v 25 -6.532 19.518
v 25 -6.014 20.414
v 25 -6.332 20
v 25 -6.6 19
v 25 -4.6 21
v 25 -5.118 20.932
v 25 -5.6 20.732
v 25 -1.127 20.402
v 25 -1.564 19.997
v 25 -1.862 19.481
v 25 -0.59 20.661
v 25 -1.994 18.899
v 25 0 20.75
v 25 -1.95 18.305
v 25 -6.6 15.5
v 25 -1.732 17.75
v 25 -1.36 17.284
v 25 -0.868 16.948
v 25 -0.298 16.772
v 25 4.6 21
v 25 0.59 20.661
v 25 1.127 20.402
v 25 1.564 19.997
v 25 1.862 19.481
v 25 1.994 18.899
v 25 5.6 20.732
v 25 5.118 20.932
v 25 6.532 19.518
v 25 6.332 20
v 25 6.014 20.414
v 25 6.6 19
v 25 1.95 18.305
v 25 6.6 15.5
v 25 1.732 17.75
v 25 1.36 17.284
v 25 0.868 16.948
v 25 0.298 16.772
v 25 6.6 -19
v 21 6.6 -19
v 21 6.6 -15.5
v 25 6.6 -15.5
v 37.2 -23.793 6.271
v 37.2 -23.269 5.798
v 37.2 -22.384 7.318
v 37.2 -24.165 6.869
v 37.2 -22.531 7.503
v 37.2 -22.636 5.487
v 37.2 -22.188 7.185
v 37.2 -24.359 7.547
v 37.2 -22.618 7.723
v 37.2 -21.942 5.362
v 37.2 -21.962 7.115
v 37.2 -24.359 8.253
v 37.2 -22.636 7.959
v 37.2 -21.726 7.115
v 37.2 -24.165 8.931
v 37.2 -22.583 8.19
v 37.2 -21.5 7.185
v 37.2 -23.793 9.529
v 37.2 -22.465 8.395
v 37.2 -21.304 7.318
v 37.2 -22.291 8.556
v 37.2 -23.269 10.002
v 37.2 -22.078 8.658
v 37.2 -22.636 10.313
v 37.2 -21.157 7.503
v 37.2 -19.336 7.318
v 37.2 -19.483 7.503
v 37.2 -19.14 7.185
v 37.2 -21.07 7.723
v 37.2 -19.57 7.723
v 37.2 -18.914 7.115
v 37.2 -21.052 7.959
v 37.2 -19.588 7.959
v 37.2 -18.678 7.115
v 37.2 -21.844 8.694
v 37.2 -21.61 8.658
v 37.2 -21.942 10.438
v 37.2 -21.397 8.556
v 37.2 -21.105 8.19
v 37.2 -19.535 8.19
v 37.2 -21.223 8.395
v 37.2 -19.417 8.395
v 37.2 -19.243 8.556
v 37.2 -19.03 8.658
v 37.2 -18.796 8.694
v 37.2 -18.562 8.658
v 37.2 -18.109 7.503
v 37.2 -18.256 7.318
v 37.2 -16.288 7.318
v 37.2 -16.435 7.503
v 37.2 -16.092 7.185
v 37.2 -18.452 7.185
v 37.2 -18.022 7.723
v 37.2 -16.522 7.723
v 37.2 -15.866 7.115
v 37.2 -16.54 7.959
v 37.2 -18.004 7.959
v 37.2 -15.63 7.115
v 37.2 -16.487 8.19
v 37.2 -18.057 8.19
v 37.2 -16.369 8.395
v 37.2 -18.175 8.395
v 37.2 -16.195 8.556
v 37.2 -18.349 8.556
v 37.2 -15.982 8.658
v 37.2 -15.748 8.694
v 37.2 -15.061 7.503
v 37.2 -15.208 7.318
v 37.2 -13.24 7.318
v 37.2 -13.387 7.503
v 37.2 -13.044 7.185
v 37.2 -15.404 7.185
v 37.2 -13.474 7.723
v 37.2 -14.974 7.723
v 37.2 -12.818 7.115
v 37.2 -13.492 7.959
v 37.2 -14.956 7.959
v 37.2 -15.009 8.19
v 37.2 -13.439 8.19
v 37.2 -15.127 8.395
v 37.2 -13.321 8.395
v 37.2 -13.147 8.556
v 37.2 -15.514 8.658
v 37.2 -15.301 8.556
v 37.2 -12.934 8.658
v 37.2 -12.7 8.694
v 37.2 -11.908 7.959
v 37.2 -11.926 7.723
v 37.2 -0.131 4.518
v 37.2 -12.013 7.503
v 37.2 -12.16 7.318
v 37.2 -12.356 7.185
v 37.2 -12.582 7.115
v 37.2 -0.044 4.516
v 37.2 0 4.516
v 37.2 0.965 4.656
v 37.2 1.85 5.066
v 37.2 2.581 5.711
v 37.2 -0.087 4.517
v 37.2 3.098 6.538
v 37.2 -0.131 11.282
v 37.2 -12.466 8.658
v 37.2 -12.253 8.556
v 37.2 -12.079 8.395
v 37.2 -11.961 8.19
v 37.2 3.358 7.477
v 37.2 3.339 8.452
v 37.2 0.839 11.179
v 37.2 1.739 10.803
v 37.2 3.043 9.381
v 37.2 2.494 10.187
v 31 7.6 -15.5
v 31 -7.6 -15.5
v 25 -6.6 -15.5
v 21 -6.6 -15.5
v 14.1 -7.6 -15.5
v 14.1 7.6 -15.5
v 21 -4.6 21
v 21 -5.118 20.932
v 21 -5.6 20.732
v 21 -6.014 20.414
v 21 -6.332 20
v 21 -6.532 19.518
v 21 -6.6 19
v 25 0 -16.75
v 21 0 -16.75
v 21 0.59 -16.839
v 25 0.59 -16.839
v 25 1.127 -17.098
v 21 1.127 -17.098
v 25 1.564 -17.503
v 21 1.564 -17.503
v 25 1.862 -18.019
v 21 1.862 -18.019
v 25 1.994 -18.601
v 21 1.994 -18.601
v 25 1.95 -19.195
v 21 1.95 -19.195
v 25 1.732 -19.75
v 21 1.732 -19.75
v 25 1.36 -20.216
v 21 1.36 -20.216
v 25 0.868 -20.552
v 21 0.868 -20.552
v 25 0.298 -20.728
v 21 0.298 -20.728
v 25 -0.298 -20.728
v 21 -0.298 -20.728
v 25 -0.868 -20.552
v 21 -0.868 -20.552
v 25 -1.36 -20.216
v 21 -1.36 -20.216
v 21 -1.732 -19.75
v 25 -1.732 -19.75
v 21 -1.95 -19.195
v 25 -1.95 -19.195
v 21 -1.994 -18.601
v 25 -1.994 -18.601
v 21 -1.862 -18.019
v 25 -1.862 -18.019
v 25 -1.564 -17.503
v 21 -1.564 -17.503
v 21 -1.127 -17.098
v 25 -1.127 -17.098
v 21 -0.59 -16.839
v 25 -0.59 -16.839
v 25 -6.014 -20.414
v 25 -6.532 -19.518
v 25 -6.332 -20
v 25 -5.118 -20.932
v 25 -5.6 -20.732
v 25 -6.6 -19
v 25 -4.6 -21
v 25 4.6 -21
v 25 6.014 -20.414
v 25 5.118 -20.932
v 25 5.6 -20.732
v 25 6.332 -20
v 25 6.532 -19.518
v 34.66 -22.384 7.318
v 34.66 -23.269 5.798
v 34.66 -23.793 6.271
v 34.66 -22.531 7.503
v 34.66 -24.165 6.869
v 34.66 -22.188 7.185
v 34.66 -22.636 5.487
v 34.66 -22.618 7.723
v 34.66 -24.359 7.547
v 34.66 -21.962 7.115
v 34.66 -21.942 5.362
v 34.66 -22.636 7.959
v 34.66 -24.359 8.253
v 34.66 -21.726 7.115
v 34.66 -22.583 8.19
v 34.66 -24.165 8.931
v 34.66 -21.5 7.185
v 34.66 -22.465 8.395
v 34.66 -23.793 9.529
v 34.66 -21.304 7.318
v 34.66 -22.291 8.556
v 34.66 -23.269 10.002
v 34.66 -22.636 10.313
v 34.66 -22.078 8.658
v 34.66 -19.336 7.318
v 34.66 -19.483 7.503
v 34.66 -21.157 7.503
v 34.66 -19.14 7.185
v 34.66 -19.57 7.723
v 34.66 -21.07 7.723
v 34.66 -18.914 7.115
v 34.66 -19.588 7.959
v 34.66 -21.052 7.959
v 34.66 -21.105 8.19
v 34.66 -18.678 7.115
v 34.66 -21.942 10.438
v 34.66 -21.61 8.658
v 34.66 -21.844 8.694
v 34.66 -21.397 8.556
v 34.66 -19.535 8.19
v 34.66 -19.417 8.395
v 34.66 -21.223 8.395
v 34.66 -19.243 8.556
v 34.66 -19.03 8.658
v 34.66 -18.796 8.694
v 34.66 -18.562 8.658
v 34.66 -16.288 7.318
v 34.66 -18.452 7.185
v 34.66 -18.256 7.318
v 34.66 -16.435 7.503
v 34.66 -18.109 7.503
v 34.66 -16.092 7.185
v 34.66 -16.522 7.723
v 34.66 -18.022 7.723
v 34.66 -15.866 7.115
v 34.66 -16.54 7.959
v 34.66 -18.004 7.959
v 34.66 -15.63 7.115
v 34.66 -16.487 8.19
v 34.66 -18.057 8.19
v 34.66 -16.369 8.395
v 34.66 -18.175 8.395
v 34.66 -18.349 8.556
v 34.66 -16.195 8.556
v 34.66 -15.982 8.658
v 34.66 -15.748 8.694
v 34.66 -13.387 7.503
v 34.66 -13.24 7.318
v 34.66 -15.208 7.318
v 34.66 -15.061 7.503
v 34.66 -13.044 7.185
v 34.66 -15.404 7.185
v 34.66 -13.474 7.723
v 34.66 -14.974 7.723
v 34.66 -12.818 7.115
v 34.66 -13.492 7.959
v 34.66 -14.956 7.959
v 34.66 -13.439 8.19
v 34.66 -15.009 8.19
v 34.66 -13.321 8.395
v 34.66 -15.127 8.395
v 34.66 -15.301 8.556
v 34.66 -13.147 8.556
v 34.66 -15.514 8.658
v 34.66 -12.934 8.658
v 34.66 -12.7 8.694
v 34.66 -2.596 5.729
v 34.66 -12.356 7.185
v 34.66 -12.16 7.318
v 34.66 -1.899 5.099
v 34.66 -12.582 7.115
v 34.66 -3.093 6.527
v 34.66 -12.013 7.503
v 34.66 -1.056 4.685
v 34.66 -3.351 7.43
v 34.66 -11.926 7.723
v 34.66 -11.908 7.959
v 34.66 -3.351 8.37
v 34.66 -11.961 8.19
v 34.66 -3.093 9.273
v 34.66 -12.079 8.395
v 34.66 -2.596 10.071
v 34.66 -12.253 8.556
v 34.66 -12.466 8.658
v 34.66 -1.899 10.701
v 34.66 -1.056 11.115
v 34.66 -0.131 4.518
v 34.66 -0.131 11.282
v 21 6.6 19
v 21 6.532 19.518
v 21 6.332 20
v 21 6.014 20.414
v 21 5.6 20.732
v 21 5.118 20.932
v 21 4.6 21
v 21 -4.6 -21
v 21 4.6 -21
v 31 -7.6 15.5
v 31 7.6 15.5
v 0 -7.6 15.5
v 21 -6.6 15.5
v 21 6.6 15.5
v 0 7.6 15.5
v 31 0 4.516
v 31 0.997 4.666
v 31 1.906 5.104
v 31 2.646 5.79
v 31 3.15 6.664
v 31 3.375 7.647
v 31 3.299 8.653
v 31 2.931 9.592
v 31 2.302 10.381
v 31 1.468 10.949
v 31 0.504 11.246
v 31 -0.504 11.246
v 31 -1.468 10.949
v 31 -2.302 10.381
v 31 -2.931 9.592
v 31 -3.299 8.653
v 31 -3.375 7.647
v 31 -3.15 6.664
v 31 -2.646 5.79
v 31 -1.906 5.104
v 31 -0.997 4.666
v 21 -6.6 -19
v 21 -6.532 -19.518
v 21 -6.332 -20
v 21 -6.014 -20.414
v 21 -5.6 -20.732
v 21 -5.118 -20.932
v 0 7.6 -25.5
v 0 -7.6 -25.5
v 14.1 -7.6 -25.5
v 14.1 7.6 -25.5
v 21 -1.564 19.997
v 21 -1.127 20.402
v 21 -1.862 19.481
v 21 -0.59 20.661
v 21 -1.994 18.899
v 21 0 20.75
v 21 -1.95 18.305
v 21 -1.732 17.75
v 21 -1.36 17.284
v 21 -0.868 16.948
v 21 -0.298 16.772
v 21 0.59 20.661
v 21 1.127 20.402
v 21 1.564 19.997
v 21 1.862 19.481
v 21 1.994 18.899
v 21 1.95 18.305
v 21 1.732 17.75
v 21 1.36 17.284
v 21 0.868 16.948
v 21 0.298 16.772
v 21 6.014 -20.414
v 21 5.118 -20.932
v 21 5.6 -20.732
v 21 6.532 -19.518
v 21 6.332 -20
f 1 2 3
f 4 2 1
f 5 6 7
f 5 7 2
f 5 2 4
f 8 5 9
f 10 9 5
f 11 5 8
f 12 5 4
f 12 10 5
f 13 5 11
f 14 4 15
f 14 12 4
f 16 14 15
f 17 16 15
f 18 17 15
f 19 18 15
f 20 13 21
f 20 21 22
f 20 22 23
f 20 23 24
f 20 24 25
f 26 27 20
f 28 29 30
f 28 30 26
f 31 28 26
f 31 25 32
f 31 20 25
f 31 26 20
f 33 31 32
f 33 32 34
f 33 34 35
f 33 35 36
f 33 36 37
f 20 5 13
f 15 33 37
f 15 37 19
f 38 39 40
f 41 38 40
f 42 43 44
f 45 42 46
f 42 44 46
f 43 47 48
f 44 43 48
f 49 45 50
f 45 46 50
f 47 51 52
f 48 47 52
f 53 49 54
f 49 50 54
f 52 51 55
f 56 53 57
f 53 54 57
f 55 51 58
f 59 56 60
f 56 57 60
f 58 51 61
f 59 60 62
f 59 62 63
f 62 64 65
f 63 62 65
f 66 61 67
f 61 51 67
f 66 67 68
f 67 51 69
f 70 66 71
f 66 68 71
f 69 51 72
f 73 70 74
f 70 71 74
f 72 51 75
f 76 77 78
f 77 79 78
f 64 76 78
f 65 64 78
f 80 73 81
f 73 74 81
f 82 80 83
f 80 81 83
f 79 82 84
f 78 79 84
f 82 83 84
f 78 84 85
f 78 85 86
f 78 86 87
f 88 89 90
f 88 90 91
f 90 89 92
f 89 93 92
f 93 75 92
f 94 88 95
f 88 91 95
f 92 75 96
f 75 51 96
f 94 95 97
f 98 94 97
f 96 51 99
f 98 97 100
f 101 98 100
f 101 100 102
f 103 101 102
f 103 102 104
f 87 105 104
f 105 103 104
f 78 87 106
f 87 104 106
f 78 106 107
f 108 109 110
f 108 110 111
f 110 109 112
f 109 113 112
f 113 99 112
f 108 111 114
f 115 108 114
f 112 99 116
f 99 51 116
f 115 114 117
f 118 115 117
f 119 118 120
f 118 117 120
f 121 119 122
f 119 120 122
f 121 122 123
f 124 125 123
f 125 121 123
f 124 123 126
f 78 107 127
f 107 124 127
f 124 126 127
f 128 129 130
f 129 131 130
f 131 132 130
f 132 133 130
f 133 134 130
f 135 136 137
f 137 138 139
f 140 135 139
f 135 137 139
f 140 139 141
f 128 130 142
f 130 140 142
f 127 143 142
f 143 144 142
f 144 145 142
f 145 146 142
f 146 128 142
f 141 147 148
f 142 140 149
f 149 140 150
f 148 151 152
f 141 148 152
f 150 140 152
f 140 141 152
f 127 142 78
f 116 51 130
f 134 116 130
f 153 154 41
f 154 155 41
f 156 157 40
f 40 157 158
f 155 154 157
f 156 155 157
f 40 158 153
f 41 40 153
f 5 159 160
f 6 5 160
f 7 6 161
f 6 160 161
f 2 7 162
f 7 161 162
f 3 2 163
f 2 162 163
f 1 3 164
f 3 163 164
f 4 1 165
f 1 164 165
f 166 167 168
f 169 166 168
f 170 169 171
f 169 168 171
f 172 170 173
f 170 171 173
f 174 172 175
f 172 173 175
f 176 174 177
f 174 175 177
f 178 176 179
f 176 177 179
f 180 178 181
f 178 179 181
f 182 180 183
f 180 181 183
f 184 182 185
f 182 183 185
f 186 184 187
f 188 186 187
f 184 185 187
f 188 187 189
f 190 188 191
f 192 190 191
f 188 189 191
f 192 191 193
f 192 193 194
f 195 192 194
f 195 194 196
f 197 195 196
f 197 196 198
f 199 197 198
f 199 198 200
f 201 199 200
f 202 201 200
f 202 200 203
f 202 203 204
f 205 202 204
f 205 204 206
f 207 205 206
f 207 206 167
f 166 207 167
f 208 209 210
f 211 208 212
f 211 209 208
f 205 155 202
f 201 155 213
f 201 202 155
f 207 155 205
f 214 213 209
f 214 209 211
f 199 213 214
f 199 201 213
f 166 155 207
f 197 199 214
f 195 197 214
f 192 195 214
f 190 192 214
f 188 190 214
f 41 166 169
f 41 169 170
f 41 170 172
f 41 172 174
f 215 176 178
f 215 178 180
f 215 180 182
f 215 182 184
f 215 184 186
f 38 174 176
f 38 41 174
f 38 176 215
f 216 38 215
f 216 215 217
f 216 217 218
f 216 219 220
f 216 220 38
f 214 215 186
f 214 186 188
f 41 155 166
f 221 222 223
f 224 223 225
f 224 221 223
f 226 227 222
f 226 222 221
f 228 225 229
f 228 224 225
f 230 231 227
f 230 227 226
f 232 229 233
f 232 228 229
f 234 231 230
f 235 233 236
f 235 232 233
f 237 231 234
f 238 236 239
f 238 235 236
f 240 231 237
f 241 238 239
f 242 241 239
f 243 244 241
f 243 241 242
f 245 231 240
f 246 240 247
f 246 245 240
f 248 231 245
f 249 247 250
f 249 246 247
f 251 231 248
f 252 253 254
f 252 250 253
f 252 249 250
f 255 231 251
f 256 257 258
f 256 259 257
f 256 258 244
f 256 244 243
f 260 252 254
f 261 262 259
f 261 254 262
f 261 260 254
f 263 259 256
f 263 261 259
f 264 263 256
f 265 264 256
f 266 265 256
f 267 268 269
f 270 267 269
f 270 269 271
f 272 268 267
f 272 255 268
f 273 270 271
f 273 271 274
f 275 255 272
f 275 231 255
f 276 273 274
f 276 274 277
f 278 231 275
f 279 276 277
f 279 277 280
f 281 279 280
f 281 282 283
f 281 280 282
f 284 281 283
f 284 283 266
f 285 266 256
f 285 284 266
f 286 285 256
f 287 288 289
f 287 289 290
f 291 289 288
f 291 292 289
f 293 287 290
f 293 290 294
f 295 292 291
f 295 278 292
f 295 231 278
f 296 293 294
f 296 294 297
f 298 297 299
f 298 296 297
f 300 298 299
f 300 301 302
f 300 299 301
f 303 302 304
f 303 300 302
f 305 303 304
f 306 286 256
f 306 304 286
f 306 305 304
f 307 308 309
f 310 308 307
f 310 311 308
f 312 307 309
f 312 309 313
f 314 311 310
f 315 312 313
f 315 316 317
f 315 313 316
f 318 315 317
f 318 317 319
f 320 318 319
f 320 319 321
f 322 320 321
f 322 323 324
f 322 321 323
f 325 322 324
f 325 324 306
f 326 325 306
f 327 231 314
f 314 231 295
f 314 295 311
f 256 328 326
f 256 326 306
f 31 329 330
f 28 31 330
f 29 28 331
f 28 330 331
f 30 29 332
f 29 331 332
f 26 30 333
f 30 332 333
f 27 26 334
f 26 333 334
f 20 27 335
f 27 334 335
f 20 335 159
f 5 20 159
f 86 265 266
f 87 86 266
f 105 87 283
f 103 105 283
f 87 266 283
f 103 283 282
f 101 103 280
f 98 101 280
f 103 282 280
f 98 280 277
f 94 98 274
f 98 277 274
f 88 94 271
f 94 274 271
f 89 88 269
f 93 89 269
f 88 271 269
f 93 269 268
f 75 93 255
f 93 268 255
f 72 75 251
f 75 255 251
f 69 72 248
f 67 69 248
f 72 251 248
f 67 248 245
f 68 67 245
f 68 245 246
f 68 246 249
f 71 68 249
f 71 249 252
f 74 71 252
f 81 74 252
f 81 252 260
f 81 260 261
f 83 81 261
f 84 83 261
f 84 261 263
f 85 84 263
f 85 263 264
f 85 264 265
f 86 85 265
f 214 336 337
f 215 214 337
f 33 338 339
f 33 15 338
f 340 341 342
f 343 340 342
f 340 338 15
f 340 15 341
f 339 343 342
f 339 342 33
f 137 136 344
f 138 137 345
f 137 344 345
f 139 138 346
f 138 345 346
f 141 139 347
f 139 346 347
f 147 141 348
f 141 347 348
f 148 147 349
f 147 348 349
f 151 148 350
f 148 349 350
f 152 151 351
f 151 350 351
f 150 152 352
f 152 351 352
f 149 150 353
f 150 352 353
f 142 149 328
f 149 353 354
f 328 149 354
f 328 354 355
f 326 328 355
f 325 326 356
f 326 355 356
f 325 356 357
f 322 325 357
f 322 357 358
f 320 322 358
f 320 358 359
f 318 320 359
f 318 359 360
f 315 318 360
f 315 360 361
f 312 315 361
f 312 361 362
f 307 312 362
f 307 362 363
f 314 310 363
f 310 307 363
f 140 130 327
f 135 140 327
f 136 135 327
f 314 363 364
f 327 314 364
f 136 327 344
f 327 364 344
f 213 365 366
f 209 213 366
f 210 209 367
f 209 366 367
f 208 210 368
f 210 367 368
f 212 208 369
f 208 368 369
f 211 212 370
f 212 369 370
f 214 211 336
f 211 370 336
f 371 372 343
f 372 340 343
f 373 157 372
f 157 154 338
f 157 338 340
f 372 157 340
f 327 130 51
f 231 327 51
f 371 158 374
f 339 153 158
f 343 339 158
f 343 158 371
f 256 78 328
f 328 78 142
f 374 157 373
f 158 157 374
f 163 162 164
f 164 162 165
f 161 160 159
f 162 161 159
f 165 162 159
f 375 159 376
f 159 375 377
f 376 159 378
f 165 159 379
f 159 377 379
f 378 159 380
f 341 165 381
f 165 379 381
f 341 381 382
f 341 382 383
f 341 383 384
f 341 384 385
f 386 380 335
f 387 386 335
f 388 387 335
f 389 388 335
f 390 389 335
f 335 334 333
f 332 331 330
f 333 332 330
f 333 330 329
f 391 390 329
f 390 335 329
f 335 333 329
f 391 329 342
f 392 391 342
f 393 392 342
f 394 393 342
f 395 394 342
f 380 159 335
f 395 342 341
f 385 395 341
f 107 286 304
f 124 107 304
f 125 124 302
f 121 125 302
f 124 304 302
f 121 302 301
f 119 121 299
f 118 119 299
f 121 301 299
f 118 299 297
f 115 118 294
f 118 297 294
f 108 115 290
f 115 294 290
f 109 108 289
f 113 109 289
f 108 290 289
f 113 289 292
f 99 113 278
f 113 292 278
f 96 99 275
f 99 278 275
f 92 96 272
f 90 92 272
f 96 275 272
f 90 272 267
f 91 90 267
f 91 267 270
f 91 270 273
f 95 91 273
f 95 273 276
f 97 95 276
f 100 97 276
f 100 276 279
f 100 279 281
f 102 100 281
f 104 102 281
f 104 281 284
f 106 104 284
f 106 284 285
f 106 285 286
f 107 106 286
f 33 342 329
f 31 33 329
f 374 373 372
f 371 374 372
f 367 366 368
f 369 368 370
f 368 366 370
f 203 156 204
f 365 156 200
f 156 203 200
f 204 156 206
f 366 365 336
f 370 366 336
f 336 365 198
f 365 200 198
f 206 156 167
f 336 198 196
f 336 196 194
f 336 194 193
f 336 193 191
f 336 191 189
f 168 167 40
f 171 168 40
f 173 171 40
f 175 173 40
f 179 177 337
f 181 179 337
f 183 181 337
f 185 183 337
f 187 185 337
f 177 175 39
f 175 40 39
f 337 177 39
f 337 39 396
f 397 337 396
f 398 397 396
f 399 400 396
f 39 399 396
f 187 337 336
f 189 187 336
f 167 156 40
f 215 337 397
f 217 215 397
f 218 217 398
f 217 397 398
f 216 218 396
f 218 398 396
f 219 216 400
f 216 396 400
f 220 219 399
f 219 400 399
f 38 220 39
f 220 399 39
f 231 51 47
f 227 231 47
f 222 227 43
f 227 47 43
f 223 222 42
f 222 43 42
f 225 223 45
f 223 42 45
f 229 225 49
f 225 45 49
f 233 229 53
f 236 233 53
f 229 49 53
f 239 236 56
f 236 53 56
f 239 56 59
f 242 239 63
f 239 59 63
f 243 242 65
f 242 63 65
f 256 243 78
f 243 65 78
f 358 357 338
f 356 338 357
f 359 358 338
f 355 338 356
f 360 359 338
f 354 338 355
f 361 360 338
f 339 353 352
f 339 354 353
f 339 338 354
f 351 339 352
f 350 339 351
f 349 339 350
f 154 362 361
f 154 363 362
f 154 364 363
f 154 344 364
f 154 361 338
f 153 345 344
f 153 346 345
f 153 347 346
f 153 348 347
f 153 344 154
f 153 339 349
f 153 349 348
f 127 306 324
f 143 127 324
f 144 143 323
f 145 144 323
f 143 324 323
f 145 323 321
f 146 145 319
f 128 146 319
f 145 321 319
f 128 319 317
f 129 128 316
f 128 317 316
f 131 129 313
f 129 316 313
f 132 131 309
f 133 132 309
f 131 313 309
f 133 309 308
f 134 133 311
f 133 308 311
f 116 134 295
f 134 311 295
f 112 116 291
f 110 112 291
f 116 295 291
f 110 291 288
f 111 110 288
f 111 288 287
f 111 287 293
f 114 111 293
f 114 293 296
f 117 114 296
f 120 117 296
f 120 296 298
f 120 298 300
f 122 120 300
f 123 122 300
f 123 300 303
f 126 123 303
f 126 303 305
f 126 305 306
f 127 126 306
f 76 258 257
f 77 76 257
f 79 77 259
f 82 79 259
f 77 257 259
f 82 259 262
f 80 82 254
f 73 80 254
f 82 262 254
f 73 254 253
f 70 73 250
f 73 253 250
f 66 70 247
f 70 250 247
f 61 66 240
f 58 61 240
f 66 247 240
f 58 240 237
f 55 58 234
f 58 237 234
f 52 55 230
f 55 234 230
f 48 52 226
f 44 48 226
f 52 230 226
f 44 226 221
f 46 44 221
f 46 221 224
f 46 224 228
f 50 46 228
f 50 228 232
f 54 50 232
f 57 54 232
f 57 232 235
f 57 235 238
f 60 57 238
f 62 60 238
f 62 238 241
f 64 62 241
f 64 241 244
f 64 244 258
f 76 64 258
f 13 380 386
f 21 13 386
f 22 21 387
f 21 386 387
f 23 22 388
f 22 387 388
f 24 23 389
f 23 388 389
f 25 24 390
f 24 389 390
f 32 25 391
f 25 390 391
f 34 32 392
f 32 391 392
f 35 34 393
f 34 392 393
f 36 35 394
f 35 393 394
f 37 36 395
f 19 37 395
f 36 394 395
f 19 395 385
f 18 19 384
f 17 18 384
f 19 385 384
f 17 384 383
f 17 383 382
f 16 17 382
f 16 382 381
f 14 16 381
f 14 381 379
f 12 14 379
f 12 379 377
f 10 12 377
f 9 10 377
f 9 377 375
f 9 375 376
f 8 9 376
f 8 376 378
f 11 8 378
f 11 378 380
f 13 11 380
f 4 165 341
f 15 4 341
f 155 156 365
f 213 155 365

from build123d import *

# Parameters (mm, degrees)
SKETCH1_W                          = 31
SKETCH1_H                          = 15.2
BOSS_EXTRUDE1_DEPTH                = 31
BOSS_EXTRUDE2_START                = 21
BOSS_EXTRUDE2_DEPTH                = 4
F_4_0MM_DOWEL_HOLE1_D              = 4
F_4_0MM_DOWEL_HOLE1_DEPTH          = 10.668
F_4_0MM_DOWEL_HOLE1_TIP            = 1.201721238
SKETCH6_R                          = 3.38413067
BOSS_EXTRUDE3_DEPTH                = 6.2
BOSS_EXTRUDE4_DEPTH                = 2.54
F_1_16_0_0625_DIAMETER_HOLE1_D     = 1.5875
F_1_16_0_0625_DIAMETER_HOLE1_DEPTH = 2.54
SKETCH12_W                         = 14.1
SKETCH12_H                         = 15.2
BOSS_EXTRUDE5_DEPTH                = 10


with BuildPart() as part:
    # Sketch1 → Boss-Extrude1 (new body)
    with BuildSketch(Plane(origin=(0, 0, 0), x_dir=(0, 0, -1), z_dir=(1, 0, 0))):
        Rectangle(SKETCH1_W, SKETCH1_H)
    extrude(amount=BOSS_EXTRUDE1_DEPTH)

    # Sketch2 → Boss-Extrude2 (add)
    with BuildSketch(Plane(origin=(0, 0, 0), x_dir=(0, 0, -1), z_dir=(1, 0, 0)).offset(BOSS_EXTRUDE2_START)):
        with BuildLine():
            Line((-15.5, 6.6), (-19, 6.6))
            ThreePointArc((-19, 6.6), (-20.414213562, 6.014213562), (-21, 4.6))
            Line((-21, 4.6), (-21, -4.6))
            ThreePointArc((-21, -4.6), (-20.414213562, -6.014213562), (-19, -6.6))
            Line((-19, -6.6), (-15.5, -6.6))
            Line((-15.5, -6.6), (-15.5, 6.6))
        make_face()
        with BuildLine():
            Line((15.5, -6.6), (19, -6.6))
            ThreePointArc((19, -6.6), (20.414213562, -6.014213562), (21, -4.6))
            Line((21, -4.6), (21, 4.6))
            ThreePointArc((21, 4.6), (20.414213562, 6.014213562), (19, 6.6))
            Line((19, 6.6), (15.5, 6.6))
            Line((15.5, 6.6), (15.5, -6.6))
        make_face()
    extrude(amount=BOSS_EXTRUDE2_DEPTH)

    # Ø4.0mm Dowel Hole1
    with Locations(Plane(origin=(25, 0, 0), x_dir=(0, 0, -1), z_dir=(1, 0, 0))):
        with Locations((-18.75, 0), (18.75, 0)):
            Hole(F_4_0MM_DOWEL_HOLE1_D / 2, depth=F_4_0MM_DOWEL_HOLE1_DEPTH)
            with Locations((0, 0, -(F_4_0MM_DOWEL_HOLE1_DEPTH + F_4_0MM_DOWEL_HOLE1_TIP / 2))):  # 118° drill point
                Cone(0, F_4_0MM_DOWEL_HOLE1_D / 2, F_4_0MM_DOWEL_HOLE1_TIP, mode=Mode.SUBTRACT)

    # Sketch6 → Boss-Extrude3 (add)
    with BuildSketch(Plane(origin=(31, 0, 0), x_dir=(0, 0, -1), z_dir=(1, 0, 0))):
        with Locations((-7.9, 0)):
            Circle(SKETCH6_R)
    extrude(amount=BOSS_EXTRUDE3_DEPTH)

    # Sketch7 → Boss-Extrude4 (add)
    with BuildSketch(Plane(origin=(37.2, 0, 0), x_dir=(0, 0, -1), z_dir=(1, 0, 0))):
        with BuildLine():
            Line((-4.518397081, -0.130774972), (-5.361897234, -21.942154729))
            ThreePointArc((-5.361897234, -21.942154729), (-7.9, -24.384), (-10.438102766, -21.942154729))
            Line((-10.438102766, -21.942154729), (-11.281602919, -0.130774972))
            ThreePointArc((-11.281602919, -0.130774972), (-7.9, 3.38413067), (-4.518397081, -0.130774972))
        make_face()
    extrude(amount=-BOSS_EXTRUDE4_DEPTH)

    # 1/16 (0.0625) Diameter Hole1
    with Locations(Plane(origin=(37.2, 0, 0), x_dir=(0, 0, -1), z_dir=(1, 0, 0))):
        with Locations((-7.9, -12.7), (-7.9, -15.748), (-7.9, -18.796), (-7.9, -21.844)):
            Hole(F_1_16_0_0625_DIAMETER_HOLE1_D / 2, depth=F_1_16_0_0625_DIAMETER_HOLE1_DEPTH)

    # Sketch12 → Boss-Extrude5 (add)
    with BuildSketch(Plane(origin=(0, 0, -15.5), x_dir=(-1, 0, 0), z_dir=(0, 0, -1))):
        with Locations((-7.05, 0)):
            Rectangle(SKETCH12_W, SKETCH12_H)
    extrude(amount=BOSS_EXTRUDE5_DEPTH)


solid = part.part
